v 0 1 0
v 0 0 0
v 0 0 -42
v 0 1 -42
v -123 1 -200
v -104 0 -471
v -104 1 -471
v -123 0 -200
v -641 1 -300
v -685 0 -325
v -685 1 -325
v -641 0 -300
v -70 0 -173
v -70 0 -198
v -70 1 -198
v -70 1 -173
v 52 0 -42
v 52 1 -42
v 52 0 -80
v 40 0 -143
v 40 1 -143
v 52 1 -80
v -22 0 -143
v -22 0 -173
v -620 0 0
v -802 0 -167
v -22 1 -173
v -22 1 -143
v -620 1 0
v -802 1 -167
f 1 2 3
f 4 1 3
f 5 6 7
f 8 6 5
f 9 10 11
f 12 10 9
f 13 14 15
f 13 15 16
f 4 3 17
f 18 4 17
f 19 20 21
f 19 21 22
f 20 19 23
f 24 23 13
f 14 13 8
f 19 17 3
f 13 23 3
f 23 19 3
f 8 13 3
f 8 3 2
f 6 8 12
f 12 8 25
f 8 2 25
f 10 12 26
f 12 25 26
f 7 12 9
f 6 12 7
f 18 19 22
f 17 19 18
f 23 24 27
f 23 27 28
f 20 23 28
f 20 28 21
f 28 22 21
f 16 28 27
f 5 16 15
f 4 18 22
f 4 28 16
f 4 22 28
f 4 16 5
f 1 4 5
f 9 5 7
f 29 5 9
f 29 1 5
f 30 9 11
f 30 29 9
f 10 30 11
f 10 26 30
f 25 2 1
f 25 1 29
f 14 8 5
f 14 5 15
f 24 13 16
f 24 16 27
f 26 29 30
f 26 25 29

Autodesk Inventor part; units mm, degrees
ref_plane "YZ Plane" through (0, 0, 0) normal (1, 0, 0) x (0, 1, 0)
ref_plane "XZ Plane" through (0, 0, 0) normal (0, 1, 0) x (-1, 0, 0)
ref_plane "XY Plane" through (0, 0, 0) normal (0, 0, 1) x (1, 0, 0)
sketch "Sketch1" plane through (0, 0, 0) normal (0, 1, 0) x (-1, 0, 0)
  line L0 (0, 0) -> (620, 0)
  line L1 (620, 0) -> (802, -167)
  line L2 (802, -167) -> (685, -325)
  line L3 (685, -325) -> (641, -300)
  line L4 (641, -300) -> (104, -471)
  line L5 (104, -471) -> (123, -200)
  line L6 (123, -200) -> (70, -198)
  line L7 (70, -198) -> (70, -173)
  line L8 (70, -173) -> (22, -173)
  line L9 (22, -173) -> (22, -143)
  line L10 (22, -143) -> (-40, -143)
  line L11 (-40, -143) -> (-52, -80)
  line L12 (-52, -80) -> (-52, -42)
  line L13 (0, 0) -> (0, -42)
  line L14 (0, -42) -> (-52, -42)
  dimension "d0" = 620
  dimension "d1" = 802
  dimension "d2" = 167
  dimension "d3" = 685
  dimension "d4" = 325
  dimension "d5" = 641
  dimension "d6" = 300
  dimension "d7" = 104
  dimension "d8" = 471
  dimension "d9" = 123
  dimension "d10" = 200
  dimension "d11" = 70
  dimension "d12" = 198
  dimension "d13" = 173
  dimension "d14" = 22
  dimension "d15" = 143
  dimension "d16" = 40
  dimension "d17" = 80
  dimension "d18" = 52
  dimension "d19" = 42
extrude "Extrusion1" add sketch "Sketch1" along normal blind 1
properties part number "Contracted_profile"
